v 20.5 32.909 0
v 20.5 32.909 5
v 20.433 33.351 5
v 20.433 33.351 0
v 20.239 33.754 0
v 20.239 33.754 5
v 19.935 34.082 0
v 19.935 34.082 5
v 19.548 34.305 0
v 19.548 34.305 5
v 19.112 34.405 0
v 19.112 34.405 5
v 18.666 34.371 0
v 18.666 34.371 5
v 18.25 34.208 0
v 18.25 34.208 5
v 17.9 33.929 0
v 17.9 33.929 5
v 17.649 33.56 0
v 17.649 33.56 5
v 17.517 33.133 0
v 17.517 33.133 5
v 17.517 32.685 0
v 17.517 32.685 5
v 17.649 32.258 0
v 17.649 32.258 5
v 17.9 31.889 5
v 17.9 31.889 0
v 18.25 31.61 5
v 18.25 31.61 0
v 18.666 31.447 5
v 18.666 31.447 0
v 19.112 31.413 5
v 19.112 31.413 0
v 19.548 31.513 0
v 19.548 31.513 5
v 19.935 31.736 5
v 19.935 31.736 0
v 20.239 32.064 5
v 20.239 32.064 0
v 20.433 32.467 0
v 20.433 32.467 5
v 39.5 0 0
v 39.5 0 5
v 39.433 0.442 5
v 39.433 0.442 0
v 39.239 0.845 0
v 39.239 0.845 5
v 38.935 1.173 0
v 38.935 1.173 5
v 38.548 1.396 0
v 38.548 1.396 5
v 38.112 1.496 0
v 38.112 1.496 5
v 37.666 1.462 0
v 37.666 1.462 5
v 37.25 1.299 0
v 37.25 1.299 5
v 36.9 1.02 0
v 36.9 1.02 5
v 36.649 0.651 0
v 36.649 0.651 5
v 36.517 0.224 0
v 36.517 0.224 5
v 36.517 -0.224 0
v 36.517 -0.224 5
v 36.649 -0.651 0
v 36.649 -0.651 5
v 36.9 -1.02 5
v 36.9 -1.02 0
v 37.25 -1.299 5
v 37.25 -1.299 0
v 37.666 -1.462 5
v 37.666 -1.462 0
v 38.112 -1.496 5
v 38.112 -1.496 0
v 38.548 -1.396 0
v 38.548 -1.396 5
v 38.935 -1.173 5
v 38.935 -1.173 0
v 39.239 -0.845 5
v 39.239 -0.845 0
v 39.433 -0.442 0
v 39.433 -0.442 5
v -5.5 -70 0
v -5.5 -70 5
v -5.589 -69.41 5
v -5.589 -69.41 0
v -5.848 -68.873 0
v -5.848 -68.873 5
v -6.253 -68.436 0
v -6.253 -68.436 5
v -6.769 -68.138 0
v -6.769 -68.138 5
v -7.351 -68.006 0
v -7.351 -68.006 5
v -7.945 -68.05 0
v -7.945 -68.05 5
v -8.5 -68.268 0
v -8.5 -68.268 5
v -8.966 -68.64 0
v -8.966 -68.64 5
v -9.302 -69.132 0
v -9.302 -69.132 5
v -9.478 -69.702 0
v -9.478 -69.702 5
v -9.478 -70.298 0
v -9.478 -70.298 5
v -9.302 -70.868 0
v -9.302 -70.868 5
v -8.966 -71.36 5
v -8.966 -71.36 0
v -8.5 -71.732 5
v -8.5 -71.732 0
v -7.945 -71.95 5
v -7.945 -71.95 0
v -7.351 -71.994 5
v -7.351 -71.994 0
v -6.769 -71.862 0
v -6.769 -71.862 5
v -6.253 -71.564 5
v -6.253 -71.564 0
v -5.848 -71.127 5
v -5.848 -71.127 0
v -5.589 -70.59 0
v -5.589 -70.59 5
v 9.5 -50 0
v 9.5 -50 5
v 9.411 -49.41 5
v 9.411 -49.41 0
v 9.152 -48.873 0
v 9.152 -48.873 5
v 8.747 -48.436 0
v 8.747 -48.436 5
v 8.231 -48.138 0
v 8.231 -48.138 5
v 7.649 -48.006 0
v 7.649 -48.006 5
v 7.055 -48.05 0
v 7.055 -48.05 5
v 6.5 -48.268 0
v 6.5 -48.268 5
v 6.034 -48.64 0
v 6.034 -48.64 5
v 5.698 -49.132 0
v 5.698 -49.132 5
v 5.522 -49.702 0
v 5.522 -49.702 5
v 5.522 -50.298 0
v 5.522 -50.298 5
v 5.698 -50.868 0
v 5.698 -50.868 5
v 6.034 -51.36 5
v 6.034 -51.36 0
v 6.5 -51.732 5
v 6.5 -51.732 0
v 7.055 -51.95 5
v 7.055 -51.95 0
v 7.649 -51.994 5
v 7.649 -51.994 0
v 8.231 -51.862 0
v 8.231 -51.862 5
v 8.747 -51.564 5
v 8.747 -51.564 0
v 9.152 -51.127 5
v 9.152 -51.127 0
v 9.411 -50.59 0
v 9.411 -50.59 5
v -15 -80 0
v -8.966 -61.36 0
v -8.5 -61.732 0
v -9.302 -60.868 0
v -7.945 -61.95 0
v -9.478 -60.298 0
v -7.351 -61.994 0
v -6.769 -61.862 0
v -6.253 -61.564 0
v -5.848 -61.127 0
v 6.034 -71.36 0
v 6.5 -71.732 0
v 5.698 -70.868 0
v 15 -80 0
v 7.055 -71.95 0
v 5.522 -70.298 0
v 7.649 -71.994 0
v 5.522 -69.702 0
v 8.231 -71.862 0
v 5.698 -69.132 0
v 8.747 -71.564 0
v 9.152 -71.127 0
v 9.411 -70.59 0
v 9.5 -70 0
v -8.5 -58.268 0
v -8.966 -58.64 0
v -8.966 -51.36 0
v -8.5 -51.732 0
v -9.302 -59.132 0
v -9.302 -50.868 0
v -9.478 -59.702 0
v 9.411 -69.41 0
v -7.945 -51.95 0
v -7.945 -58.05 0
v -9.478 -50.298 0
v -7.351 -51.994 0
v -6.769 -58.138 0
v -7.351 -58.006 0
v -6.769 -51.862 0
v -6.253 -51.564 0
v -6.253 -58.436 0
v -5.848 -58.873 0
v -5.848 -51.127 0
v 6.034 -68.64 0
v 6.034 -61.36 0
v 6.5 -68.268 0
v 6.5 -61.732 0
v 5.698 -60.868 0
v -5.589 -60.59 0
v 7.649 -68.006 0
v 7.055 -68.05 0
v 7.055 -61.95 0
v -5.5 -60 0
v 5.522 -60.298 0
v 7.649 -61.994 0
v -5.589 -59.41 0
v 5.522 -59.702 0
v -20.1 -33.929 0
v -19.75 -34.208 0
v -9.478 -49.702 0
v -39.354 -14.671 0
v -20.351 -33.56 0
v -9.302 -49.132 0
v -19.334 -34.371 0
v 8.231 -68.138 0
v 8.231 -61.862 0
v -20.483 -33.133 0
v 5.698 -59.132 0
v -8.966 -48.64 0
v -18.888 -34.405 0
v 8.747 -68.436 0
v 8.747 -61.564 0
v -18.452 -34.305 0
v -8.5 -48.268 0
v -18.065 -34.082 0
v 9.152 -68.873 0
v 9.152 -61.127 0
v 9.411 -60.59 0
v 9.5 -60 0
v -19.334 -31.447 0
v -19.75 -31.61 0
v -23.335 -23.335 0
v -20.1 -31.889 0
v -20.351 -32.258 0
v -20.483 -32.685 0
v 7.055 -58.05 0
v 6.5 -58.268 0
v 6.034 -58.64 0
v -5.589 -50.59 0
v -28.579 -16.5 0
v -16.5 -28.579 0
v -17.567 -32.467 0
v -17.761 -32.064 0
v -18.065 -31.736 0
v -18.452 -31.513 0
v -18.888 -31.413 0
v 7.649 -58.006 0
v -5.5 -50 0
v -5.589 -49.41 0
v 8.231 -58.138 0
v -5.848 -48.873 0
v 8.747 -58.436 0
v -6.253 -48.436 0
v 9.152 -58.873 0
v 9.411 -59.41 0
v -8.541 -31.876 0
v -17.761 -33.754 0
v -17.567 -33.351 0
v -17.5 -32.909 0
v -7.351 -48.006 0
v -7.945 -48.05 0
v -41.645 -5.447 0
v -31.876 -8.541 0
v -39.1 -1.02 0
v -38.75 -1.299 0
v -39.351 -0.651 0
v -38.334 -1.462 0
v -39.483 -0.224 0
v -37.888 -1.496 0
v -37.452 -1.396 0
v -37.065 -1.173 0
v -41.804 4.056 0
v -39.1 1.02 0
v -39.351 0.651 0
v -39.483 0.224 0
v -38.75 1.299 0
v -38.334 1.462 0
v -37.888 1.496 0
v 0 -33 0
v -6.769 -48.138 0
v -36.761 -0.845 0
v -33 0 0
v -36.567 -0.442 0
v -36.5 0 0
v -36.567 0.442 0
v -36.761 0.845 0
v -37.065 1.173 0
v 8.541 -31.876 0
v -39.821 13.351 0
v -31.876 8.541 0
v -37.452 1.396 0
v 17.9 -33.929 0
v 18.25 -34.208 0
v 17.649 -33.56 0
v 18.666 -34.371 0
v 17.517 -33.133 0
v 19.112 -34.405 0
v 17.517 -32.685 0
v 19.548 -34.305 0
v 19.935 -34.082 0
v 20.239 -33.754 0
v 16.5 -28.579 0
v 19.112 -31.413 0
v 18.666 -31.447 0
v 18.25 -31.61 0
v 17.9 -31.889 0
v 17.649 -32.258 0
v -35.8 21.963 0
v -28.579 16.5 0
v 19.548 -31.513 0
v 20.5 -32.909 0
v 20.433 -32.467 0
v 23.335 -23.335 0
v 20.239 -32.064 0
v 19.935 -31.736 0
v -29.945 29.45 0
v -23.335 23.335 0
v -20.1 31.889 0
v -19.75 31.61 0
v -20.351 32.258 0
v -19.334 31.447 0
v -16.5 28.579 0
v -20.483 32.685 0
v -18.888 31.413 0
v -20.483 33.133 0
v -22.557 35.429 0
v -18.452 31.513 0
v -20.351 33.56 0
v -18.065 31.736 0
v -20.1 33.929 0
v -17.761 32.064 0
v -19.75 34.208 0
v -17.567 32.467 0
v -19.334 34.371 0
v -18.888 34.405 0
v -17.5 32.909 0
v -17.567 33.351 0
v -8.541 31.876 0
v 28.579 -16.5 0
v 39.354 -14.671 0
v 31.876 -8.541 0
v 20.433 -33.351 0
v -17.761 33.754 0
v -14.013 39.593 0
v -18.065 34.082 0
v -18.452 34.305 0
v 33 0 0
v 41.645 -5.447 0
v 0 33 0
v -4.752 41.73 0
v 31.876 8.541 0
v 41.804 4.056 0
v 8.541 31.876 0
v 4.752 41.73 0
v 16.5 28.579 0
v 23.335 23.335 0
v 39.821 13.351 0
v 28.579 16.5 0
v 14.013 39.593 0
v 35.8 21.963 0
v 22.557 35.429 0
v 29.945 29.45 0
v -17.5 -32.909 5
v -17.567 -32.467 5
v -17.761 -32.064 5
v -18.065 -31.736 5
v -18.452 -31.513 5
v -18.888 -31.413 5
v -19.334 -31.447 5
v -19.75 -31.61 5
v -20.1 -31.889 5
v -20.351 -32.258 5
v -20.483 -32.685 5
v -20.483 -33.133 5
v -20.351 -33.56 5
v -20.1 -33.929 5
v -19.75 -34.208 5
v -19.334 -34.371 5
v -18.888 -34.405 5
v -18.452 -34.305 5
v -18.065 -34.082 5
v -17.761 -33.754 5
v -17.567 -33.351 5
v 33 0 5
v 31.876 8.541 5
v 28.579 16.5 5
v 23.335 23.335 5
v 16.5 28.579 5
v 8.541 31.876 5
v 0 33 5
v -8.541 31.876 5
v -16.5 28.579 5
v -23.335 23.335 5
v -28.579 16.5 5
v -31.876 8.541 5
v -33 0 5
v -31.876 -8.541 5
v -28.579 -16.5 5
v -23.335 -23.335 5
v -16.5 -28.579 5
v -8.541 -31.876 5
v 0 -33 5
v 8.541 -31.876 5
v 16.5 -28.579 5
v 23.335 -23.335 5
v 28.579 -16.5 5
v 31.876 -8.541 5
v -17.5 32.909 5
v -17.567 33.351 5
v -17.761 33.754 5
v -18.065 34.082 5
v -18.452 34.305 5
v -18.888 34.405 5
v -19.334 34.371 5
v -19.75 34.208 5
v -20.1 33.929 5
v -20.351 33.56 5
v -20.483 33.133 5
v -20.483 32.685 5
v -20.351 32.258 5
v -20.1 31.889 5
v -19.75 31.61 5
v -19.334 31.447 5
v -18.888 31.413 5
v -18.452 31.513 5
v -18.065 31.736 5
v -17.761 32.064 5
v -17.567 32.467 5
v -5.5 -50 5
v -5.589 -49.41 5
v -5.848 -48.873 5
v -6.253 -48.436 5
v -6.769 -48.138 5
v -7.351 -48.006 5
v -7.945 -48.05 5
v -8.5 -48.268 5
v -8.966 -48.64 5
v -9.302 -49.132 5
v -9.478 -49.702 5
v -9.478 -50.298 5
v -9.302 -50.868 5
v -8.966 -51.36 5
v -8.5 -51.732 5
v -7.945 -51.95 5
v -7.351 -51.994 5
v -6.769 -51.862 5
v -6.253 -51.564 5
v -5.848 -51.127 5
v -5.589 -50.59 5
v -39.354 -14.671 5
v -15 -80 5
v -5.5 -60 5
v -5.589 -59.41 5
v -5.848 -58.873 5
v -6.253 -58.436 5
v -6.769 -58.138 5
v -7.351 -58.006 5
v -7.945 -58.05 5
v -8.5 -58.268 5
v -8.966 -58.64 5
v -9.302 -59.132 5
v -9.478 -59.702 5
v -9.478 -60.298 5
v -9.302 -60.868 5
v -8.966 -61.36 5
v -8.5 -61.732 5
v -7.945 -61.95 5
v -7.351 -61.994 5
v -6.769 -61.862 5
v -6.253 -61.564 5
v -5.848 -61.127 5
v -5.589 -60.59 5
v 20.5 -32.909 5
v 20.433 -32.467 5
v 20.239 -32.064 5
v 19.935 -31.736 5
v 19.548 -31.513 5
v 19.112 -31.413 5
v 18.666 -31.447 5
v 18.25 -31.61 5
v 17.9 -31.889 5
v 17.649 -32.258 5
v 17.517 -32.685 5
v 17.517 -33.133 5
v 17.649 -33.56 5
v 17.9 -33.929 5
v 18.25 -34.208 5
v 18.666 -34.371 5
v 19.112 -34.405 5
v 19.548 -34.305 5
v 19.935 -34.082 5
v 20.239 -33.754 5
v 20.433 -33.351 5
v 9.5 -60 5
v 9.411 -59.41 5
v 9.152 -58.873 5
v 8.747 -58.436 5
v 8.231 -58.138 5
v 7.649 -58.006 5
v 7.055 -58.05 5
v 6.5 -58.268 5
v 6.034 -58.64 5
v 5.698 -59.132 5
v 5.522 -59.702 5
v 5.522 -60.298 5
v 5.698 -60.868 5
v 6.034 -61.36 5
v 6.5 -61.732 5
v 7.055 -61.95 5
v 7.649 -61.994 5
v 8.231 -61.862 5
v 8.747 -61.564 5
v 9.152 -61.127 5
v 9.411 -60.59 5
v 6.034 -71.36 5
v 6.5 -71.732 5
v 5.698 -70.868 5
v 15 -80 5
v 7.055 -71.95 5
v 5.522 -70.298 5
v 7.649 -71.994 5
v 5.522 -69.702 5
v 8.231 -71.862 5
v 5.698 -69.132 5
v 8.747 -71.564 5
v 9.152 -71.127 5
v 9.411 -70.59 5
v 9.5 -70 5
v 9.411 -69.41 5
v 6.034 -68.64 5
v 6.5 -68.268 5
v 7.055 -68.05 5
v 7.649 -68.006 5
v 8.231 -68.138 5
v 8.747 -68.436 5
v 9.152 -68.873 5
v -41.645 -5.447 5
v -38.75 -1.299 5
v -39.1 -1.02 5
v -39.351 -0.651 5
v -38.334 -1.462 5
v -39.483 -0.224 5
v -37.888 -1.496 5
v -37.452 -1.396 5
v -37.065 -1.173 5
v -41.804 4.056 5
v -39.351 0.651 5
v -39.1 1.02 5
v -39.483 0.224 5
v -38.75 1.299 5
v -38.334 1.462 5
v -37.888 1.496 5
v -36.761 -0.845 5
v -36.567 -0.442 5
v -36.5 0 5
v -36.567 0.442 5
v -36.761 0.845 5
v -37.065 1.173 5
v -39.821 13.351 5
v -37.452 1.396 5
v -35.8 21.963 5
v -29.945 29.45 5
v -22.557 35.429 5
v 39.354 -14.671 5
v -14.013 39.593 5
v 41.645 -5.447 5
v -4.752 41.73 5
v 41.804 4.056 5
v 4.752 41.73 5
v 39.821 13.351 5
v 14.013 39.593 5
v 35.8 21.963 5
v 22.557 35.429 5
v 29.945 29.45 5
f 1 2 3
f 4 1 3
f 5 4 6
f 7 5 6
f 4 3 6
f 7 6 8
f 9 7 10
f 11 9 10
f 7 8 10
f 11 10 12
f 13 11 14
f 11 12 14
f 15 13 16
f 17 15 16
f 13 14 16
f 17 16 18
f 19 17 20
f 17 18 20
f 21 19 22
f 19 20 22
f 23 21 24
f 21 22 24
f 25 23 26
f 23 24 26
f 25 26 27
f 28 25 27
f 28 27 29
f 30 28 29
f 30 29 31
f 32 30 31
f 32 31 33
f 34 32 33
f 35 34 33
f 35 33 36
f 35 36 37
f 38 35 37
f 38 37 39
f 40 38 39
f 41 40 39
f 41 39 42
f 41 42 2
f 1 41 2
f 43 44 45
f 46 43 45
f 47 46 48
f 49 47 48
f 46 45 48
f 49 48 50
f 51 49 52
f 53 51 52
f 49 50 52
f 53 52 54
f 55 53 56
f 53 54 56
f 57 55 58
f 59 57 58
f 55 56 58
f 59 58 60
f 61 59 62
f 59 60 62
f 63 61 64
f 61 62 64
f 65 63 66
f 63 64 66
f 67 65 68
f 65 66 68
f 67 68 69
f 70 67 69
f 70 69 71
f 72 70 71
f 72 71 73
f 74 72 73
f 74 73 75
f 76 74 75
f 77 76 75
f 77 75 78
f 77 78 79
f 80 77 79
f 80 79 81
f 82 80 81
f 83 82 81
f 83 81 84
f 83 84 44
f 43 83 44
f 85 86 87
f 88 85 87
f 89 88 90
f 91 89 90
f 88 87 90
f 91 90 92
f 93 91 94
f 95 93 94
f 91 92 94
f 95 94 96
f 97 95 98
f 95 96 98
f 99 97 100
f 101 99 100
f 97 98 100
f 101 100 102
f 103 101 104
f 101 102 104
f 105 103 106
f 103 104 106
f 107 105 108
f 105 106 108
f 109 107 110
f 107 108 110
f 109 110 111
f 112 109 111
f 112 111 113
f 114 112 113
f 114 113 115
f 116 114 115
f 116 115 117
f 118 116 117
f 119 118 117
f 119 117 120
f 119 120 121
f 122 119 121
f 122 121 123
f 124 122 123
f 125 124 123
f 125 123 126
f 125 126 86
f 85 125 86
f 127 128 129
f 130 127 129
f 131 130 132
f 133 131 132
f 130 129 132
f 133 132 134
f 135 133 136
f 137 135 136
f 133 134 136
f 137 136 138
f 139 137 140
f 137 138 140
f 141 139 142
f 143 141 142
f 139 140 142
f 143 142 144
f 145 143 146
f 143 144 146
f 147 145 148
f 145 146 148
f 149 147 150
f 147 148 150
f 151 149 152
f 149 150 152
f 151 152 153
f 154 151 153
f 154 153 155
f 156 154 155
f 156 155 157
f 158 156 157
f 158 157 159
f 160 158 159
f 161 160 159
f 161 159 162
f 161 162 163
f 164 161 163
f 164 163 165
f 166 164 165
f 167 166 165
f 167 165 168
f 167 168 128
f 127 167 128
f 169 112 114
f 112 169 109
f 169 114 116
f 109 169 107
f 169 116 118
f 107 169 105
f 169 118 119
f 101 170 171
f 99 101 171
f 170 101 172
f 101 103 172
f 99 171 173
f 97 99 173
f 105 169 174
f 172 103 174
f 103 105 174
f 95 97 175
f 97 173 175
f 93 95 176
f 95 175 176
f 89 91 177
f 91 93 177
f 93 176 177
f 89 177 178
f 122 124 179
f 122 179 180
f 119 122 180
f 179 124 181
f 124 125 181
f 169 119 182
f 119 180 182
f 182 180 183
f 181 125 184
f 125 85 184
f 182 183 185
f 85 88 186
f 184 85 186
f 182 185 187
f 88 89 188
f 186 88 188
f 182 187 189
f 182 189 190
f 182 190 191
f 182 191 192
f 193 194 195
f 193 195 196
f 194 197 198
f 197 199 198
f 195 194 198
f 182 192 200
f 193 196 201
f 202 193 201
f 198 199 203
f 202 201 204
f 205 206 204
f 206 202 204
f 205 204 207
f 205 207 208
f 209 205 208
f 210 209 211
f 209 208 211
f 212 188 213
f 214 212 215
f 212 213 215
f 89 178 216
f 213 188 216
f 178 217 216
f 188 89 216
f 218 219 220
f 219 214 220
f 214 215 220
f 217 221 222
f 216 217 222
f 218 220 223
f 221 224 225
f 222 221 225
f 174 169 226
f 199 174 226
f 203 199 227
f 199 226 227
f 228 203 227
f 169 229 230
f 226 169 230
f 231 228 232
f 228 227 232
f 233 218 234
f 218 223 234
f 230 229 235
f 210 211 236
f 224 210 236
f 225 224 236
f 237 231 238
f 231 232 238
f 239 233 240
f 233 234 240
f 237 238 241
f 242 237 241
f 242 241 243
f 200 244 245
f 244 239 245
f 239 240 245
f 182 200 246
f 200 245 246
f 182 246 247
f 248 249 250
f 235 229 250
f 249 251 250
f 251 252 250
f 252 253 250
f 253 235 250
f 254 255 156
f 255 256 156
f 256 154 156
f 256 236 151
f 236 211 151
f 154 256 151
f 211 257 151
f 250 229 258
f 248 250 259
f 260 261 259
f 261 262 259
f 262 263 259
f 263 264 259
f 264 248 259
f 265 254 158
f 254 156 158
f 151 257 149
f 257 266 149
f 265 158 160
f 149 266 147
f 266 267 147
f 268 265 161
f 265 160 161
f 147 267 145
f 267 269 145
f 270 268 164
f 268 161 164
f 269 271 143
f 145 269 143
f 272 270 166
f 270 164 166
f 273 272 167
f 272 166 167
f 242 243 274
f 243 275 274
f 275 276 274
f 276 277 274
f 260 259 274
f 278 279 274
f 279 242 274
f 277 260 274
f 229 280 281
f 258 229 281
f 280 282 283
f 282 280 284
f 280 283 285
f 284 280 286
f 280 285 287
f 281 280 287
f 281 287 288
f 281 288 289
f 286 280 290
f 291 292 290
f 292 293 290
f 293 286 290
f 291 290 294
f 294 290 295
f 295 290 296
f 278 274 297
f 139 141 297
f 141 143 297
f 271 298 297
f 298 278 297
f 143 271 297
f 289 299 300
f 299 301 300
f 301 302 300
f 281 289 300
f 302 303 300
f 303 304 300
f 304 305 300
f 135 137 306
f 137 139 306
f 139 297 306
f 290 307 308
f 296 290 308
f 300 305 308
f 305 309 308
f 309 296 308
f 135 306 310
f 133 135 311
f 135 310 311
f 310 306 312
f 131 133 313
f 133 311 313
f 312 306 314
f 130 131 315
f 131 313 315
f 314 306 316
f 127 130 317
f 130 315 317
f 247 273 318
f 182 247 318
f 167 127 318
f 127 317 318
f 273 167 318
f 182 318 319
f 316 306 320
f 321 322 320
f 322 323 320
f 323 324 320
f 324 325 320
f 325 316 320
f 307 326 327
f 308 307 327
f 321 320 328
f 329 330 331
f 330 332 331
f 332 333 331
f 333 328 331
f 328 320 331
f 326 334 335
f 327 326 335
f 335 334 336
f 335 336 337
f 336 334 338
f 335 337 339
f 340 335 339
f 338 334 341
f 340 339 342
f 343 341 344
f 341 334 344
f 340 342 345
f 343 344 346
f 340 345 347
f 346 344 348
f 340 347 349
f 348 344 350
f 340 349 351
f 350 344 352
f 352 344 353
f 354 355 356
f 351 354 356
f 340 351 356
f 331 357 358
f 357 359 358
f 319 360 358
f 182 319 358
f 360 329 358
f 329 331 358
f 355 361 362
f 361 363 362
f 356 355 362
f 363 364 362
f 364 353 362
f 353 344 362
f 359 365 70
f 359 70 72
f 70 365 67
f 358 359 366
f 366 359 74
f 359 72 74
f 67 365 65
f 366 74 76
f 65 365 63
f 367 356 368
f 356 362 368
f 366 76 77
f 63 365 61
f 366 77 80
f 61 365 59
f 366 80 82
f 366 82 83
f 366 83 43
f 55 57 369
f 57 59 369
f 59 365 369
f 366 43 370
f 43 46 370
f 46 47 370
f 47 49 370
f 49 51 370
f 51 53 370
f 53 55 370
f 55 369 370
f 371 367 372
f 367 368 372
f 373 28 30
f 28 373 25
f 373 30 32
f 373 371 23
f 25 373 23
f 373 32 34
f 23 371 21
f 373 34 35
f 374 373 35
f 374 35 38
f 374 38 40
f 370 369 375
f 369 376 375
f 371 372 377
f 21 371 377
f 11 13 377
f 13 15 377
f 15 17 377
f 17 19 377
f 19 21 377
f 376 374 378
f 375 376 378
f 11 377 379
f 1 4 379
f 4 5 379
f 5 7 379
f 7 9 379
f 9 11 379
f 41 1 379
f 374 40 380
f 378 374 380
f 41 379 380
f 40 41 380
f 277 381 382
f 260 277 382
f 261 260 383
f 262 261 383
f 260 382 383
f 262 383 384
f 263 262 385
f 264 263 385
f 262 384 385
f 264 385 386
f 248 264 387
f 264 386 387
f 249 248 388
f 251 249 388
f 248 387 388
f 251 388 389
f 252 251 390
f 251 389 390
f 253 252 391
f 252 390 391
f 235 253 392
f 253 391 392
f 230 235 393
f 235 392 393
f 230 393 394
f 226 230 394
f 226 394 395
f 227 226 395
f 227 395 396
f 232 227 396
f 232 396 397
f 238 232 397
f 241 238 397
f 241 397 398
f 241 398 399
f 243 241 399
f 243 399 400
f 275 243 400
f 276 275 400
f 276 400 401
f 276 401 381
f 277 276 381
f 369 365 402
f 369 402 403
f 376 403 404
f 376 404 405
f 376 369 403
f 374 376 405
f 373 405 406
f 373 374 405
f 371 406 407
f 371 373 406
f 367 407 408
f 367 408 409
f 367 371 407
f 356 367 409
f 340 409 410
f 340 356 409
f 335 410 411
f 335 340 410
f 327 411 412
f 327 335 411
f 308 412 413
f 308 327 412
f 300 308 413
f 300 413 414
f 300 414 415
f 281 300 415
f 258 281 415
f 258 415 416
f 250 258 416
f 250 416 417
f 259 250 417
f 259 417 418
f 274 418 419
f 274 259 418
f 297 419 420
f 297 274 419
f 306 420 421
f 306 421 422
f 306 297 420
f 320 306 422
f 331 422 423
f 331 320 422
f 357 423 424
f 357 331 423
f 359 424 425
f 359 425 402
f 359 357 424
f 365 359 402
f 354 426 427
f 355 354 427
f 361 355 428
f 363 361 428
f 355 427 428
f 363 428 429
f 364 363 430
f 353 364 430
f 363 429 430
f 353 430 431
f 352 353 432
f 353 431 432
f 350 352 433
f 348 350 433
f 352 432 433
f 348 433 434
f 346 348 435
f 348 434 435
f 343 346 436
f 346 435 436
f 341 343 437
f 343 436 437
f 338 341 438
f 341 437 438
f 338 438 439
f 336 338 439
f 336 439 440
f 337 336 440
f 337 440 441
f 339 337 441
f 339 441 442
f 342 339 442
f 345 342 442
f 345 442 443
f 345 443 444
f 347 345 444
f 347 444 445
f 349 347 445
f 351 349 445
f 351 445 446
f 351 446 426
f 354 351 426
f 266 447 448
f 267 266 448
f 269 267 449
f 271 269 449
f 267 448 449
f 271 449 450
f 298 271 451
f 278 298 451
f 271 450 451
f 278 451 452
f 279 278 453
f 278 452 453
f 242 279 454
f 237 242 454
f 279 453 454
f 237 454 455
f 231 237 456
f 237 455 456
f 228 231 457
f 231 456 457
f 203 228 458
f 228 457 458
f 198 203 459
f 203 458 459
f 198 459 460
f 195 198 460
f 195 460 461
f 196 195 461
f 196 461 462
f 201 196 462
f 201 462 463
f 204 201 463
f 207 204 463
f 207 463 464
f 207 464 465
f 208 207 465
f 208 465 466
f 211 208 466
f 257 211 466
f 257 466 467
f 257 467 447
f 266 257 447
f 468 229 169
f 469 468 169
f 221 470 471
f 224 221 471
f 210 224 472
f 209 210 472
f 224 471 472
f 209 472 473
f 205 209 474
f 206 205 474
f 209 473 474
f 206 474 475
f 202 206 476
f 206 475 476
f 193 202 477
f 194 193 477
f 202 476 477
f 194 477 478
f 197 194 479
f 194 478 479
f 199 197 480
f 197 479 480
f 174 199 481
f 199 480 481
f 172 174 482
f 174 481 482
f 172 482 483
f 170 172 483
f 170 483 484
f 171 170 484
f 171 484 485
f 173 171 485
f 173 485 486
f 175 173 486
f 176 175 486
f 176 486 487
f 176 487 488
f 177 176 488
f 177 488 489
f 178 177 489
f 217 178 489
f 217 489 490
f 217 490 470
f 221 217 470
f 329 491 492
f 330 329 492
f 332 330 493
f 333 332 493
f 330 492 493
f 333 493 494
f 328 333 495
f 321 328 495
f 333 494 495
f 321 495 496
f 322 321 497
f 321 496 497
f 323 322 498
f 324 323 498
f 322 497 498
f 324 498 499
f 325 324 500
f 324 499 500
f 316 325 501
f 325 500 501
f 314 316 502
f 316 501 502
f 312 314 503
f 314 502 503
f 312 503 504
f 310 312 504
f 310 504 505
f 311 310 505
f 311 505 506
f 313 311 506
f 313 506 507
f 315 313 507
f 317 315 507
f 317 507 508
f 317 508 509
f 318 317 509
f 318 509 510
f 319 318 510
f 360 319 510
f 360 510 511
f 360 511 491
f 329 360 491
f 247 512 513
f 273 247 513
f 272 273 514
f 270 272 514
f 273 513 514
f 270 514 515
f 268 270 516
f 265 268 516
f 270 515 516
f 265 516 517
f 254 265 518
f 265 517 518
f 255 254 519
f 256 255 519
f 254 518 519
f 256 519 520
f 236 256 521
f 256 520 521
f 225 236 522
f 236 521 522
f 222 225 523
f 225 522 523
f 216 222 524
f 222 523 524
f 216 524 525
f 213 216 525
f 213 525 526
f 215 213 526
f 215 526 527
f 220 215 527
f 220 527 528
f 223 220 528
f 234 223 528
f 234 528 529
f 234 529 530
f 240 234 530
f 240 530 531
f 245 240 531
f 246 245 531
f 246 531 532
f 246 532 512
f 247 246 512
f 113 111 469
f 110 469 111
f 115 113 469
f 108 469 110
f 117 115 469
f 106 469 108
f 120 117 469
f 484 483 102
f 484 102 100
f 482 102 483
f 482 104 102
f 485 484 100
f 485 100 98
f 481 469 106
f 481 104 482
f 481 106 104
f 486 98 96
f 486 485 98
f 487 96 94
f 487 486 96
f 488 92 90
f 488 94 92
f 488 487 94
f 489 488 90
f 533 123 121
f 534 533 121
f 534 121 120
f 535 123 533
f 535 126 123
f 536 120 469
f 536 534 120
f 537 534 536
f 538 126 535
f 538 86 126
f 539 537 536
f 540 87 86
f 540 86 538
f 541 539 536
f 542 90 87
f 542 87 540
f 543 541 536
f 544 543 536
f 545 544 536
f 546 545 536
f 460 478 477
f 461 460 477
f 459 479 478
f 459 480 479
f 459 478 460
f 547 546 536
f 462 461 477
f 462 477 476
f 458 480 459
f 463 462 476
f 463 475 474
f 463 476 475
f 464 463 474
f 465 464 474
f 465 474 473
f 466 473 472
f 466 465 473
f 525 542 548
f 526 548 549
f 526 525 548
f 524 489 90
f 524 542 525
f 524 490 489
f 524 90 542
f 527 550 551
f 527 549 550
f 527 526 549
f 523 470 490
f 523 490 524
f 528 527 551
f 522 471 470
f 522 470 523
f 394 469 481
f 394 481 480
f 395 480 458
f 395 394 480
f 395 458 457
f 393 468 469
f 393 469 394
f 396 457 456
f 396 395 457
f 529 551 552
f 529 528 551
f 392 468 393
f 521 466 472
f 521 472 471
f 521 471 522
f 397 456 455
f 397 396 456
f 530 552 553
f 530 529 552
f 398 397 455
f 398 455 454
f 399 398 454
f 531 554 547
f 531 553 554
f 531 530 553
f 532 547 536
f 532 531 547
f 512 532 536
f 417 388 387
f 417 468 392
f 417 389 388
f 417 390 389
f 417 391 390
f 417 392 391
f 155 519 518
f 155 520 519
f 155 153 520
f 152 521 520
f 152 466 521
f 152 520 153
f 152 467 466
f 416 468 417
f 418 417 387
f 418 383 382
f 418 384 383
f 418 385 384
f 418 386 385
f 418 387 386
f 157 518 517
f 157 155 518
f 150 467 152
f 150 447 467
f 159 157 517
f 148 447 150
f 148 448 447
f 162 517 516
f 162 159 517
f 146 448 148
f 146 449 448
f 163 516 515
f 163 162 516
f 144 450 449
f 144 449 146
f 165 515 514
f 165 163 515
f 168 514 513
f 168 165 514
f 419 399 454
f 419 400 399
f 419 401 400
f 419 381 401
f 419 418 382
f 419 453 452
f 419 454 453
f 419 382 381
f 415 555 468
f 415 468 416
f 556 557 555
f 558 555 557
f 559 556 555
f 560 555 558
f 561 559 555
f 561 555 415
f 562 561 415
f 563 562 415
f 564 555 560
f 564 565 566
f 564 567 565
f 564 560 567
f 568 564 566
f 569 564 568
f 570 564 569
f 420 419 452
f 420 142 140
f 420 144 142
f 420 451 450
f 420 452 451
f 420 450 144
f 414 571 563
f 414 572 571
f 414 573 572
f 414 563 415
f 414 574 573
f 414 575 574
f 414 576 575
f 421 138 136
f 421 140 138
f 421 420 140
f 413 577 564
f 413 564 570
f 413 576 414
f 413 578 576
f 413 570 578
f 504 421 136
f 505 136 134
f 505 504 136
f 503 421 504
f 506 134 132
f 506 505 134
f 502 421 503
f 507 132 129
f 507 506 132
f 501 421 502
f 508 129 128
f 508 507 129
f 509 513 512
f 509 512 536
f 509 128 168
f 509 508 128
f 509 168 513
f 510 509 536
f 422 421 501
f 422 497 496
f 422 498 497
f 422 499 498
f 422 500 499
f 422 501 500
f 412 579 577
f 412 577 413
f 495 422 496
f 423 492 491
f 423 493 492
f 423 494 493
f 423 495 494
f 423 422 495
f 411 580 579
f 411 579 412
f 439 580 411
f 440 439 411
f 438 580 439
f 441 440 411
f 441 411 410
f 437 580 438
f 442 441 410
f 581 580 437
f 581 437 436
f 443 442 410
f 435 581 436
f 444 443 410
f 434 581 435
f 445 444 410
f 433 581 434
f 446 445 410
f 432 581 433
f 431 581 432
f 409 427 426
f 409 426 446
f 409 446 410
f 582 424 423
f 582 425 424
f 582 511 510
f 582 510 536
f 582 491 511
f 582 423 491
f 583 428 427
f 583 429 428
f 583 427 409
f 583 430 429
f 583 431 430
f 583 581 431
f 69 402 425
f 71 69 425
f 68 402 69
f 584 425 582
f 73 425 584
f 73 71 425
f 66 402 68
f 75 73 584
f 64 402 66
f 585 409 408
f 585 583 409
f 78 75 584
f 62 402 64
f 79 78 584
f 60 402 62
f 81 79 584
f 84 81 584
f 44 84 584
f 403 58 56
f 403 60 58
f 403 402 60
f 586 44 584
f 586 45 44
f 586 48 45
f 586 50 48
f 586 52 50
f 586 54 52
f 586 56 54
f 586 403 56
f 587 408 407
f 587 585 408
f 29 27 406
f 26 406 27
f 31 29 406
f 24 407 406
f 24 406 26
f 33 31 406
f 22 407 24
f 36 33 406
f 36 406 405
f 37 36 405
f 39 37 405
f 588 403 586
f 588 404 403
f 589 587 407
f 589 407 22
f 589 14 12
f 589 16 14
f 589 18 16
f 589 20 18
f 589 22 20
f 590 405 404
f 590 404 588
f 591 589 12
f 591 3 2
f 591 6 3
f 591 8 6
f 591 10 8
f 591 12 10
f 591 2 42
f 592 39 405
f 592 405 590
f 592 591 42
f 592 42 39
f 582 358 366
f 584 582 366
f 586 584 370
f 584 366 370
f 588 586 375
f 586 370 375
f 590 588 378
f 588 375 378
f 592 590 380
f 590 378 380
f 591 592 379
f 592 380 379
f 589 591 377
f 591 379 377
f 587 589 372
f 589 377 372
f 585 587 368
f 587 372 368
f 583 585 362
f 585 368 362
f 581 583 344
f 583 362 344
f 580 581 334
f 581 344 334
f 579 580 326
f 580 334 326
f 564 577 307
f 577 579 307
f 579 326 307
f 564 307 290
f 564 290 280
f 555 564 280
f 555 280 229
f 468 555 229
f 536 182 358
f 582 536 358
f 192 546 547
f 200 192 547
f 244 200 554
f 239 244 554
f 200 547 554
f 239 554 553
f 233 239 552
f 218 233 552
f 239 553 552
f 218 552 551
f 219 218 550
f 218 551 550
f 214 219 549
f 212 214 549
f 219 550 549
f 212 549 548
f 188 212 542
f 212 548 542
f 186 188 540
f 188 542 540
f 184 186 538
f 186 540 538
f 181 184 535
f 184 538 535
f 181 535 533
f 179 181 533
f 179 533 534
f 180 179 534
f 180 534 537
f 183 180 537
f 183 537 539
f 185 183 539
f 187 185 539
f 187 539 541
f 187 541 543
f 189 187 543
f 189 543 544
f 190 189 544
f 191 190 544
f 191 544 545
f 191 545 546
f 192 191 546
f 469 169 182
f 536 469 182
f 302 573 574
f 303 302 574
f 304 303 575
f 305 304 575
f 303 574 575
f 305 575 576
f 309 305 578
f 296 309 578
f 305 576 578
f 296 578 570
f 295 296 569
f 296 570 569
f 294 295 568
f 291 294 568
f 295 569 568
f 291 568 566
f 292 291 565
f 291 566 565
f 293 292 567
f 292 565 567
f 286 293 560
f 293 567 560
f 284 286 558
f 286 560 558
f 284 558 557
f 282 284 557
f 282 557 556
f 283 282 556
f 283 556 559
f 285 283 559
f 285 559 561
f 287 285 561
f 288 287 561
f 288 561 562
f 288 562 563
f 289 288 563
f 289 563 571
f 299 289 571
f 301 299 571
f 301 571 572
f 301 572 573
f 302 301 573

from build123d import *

# Parameters (mm, degrees)
SKETCH1_R           = 42
SKETCH1_R_2         = 33
BOSS_EXTRUDE1_DEPTH = 5
SKETCH9_R           = 1.5
CUT_EXTRUDE5_DEPTH  = 7
SKETCH10_R          = 2
CUT_EXTRUDE6_DEPTH  = 7


with BuildPart() as part:
    # Sketch1 → Boss-Extrude1 (new body)
    # profile 1 of 2: a face of its own
    with BuildSketch(Plane.XY):
        Circle(SKETCH1_R)
        Circle(SKETCH1_R_2, mode=Mode.SUBTRACT)
    # profile 2 of 2: a face of its own
    with BuildSketch(Plane.XY):
        with BuildLine():
            Line((-15, -80), (15, -80))
            Line((15, -80), (39.354283789, -14.67107179))
            ThreePointArc((39.354283789, -14.67107179), (0, -42), (-39.354283789, -14.67107179))
            Line((-39.354283789, -14.67107179), (-15, -80))
        make_face()
    extrude(amount=BOSS_EXTRUDE1_DEPTH)

    # Sketch9 → Cut-Extrude5 (cut)
    with BuildSketch(Plane.XY.offset(5)):
        with Locations((19, 32.908965344)):
            Circle(SKETCH9_R)
        with Locations((38, 0)):
            Circle(SKETCH9_R)
        with Locations((19, -32.908965344)):
            Circle(SKETCH9_R)
        with Locations((-19, -32.908965344)):
            Circle(SKETCH9_R)
        with Locations((-38, 0)):
            Circle(SKETCH9_R)
        with Locations((-19, 32.908965344)):
            Circle(SKETCH9_R)
    extrude(amount=-CUT_EXTRUDE5_DEPTH, mode=Mode.SUBTRACT)

    # Sketch10 → Cut-Extrude6 (cut)
    with BuildSketch(Plane.XY.offset(5)):
        with Locations((7.5, -60)):
            Circle(SKETCH10_R)
        with Locations((7.5, -70)):
            Circle(SKETCH10_R)
        with Locations((-7.5, -70)):
            Circle(SKETCH10_R)
        with Locations((-7.5, -60)):
            Circle(SKETCH10_R)
        with Locations((-7.5, -50)):
            Circle(SKETCH10_R)
        with Locations((7.5, -50)):
            Circle(SKETCH10_R)
    extrude(amount=-CUT_EXTRUDE6_DEPTH, mode=Mode.SUBTRACT)


solid = part.part
